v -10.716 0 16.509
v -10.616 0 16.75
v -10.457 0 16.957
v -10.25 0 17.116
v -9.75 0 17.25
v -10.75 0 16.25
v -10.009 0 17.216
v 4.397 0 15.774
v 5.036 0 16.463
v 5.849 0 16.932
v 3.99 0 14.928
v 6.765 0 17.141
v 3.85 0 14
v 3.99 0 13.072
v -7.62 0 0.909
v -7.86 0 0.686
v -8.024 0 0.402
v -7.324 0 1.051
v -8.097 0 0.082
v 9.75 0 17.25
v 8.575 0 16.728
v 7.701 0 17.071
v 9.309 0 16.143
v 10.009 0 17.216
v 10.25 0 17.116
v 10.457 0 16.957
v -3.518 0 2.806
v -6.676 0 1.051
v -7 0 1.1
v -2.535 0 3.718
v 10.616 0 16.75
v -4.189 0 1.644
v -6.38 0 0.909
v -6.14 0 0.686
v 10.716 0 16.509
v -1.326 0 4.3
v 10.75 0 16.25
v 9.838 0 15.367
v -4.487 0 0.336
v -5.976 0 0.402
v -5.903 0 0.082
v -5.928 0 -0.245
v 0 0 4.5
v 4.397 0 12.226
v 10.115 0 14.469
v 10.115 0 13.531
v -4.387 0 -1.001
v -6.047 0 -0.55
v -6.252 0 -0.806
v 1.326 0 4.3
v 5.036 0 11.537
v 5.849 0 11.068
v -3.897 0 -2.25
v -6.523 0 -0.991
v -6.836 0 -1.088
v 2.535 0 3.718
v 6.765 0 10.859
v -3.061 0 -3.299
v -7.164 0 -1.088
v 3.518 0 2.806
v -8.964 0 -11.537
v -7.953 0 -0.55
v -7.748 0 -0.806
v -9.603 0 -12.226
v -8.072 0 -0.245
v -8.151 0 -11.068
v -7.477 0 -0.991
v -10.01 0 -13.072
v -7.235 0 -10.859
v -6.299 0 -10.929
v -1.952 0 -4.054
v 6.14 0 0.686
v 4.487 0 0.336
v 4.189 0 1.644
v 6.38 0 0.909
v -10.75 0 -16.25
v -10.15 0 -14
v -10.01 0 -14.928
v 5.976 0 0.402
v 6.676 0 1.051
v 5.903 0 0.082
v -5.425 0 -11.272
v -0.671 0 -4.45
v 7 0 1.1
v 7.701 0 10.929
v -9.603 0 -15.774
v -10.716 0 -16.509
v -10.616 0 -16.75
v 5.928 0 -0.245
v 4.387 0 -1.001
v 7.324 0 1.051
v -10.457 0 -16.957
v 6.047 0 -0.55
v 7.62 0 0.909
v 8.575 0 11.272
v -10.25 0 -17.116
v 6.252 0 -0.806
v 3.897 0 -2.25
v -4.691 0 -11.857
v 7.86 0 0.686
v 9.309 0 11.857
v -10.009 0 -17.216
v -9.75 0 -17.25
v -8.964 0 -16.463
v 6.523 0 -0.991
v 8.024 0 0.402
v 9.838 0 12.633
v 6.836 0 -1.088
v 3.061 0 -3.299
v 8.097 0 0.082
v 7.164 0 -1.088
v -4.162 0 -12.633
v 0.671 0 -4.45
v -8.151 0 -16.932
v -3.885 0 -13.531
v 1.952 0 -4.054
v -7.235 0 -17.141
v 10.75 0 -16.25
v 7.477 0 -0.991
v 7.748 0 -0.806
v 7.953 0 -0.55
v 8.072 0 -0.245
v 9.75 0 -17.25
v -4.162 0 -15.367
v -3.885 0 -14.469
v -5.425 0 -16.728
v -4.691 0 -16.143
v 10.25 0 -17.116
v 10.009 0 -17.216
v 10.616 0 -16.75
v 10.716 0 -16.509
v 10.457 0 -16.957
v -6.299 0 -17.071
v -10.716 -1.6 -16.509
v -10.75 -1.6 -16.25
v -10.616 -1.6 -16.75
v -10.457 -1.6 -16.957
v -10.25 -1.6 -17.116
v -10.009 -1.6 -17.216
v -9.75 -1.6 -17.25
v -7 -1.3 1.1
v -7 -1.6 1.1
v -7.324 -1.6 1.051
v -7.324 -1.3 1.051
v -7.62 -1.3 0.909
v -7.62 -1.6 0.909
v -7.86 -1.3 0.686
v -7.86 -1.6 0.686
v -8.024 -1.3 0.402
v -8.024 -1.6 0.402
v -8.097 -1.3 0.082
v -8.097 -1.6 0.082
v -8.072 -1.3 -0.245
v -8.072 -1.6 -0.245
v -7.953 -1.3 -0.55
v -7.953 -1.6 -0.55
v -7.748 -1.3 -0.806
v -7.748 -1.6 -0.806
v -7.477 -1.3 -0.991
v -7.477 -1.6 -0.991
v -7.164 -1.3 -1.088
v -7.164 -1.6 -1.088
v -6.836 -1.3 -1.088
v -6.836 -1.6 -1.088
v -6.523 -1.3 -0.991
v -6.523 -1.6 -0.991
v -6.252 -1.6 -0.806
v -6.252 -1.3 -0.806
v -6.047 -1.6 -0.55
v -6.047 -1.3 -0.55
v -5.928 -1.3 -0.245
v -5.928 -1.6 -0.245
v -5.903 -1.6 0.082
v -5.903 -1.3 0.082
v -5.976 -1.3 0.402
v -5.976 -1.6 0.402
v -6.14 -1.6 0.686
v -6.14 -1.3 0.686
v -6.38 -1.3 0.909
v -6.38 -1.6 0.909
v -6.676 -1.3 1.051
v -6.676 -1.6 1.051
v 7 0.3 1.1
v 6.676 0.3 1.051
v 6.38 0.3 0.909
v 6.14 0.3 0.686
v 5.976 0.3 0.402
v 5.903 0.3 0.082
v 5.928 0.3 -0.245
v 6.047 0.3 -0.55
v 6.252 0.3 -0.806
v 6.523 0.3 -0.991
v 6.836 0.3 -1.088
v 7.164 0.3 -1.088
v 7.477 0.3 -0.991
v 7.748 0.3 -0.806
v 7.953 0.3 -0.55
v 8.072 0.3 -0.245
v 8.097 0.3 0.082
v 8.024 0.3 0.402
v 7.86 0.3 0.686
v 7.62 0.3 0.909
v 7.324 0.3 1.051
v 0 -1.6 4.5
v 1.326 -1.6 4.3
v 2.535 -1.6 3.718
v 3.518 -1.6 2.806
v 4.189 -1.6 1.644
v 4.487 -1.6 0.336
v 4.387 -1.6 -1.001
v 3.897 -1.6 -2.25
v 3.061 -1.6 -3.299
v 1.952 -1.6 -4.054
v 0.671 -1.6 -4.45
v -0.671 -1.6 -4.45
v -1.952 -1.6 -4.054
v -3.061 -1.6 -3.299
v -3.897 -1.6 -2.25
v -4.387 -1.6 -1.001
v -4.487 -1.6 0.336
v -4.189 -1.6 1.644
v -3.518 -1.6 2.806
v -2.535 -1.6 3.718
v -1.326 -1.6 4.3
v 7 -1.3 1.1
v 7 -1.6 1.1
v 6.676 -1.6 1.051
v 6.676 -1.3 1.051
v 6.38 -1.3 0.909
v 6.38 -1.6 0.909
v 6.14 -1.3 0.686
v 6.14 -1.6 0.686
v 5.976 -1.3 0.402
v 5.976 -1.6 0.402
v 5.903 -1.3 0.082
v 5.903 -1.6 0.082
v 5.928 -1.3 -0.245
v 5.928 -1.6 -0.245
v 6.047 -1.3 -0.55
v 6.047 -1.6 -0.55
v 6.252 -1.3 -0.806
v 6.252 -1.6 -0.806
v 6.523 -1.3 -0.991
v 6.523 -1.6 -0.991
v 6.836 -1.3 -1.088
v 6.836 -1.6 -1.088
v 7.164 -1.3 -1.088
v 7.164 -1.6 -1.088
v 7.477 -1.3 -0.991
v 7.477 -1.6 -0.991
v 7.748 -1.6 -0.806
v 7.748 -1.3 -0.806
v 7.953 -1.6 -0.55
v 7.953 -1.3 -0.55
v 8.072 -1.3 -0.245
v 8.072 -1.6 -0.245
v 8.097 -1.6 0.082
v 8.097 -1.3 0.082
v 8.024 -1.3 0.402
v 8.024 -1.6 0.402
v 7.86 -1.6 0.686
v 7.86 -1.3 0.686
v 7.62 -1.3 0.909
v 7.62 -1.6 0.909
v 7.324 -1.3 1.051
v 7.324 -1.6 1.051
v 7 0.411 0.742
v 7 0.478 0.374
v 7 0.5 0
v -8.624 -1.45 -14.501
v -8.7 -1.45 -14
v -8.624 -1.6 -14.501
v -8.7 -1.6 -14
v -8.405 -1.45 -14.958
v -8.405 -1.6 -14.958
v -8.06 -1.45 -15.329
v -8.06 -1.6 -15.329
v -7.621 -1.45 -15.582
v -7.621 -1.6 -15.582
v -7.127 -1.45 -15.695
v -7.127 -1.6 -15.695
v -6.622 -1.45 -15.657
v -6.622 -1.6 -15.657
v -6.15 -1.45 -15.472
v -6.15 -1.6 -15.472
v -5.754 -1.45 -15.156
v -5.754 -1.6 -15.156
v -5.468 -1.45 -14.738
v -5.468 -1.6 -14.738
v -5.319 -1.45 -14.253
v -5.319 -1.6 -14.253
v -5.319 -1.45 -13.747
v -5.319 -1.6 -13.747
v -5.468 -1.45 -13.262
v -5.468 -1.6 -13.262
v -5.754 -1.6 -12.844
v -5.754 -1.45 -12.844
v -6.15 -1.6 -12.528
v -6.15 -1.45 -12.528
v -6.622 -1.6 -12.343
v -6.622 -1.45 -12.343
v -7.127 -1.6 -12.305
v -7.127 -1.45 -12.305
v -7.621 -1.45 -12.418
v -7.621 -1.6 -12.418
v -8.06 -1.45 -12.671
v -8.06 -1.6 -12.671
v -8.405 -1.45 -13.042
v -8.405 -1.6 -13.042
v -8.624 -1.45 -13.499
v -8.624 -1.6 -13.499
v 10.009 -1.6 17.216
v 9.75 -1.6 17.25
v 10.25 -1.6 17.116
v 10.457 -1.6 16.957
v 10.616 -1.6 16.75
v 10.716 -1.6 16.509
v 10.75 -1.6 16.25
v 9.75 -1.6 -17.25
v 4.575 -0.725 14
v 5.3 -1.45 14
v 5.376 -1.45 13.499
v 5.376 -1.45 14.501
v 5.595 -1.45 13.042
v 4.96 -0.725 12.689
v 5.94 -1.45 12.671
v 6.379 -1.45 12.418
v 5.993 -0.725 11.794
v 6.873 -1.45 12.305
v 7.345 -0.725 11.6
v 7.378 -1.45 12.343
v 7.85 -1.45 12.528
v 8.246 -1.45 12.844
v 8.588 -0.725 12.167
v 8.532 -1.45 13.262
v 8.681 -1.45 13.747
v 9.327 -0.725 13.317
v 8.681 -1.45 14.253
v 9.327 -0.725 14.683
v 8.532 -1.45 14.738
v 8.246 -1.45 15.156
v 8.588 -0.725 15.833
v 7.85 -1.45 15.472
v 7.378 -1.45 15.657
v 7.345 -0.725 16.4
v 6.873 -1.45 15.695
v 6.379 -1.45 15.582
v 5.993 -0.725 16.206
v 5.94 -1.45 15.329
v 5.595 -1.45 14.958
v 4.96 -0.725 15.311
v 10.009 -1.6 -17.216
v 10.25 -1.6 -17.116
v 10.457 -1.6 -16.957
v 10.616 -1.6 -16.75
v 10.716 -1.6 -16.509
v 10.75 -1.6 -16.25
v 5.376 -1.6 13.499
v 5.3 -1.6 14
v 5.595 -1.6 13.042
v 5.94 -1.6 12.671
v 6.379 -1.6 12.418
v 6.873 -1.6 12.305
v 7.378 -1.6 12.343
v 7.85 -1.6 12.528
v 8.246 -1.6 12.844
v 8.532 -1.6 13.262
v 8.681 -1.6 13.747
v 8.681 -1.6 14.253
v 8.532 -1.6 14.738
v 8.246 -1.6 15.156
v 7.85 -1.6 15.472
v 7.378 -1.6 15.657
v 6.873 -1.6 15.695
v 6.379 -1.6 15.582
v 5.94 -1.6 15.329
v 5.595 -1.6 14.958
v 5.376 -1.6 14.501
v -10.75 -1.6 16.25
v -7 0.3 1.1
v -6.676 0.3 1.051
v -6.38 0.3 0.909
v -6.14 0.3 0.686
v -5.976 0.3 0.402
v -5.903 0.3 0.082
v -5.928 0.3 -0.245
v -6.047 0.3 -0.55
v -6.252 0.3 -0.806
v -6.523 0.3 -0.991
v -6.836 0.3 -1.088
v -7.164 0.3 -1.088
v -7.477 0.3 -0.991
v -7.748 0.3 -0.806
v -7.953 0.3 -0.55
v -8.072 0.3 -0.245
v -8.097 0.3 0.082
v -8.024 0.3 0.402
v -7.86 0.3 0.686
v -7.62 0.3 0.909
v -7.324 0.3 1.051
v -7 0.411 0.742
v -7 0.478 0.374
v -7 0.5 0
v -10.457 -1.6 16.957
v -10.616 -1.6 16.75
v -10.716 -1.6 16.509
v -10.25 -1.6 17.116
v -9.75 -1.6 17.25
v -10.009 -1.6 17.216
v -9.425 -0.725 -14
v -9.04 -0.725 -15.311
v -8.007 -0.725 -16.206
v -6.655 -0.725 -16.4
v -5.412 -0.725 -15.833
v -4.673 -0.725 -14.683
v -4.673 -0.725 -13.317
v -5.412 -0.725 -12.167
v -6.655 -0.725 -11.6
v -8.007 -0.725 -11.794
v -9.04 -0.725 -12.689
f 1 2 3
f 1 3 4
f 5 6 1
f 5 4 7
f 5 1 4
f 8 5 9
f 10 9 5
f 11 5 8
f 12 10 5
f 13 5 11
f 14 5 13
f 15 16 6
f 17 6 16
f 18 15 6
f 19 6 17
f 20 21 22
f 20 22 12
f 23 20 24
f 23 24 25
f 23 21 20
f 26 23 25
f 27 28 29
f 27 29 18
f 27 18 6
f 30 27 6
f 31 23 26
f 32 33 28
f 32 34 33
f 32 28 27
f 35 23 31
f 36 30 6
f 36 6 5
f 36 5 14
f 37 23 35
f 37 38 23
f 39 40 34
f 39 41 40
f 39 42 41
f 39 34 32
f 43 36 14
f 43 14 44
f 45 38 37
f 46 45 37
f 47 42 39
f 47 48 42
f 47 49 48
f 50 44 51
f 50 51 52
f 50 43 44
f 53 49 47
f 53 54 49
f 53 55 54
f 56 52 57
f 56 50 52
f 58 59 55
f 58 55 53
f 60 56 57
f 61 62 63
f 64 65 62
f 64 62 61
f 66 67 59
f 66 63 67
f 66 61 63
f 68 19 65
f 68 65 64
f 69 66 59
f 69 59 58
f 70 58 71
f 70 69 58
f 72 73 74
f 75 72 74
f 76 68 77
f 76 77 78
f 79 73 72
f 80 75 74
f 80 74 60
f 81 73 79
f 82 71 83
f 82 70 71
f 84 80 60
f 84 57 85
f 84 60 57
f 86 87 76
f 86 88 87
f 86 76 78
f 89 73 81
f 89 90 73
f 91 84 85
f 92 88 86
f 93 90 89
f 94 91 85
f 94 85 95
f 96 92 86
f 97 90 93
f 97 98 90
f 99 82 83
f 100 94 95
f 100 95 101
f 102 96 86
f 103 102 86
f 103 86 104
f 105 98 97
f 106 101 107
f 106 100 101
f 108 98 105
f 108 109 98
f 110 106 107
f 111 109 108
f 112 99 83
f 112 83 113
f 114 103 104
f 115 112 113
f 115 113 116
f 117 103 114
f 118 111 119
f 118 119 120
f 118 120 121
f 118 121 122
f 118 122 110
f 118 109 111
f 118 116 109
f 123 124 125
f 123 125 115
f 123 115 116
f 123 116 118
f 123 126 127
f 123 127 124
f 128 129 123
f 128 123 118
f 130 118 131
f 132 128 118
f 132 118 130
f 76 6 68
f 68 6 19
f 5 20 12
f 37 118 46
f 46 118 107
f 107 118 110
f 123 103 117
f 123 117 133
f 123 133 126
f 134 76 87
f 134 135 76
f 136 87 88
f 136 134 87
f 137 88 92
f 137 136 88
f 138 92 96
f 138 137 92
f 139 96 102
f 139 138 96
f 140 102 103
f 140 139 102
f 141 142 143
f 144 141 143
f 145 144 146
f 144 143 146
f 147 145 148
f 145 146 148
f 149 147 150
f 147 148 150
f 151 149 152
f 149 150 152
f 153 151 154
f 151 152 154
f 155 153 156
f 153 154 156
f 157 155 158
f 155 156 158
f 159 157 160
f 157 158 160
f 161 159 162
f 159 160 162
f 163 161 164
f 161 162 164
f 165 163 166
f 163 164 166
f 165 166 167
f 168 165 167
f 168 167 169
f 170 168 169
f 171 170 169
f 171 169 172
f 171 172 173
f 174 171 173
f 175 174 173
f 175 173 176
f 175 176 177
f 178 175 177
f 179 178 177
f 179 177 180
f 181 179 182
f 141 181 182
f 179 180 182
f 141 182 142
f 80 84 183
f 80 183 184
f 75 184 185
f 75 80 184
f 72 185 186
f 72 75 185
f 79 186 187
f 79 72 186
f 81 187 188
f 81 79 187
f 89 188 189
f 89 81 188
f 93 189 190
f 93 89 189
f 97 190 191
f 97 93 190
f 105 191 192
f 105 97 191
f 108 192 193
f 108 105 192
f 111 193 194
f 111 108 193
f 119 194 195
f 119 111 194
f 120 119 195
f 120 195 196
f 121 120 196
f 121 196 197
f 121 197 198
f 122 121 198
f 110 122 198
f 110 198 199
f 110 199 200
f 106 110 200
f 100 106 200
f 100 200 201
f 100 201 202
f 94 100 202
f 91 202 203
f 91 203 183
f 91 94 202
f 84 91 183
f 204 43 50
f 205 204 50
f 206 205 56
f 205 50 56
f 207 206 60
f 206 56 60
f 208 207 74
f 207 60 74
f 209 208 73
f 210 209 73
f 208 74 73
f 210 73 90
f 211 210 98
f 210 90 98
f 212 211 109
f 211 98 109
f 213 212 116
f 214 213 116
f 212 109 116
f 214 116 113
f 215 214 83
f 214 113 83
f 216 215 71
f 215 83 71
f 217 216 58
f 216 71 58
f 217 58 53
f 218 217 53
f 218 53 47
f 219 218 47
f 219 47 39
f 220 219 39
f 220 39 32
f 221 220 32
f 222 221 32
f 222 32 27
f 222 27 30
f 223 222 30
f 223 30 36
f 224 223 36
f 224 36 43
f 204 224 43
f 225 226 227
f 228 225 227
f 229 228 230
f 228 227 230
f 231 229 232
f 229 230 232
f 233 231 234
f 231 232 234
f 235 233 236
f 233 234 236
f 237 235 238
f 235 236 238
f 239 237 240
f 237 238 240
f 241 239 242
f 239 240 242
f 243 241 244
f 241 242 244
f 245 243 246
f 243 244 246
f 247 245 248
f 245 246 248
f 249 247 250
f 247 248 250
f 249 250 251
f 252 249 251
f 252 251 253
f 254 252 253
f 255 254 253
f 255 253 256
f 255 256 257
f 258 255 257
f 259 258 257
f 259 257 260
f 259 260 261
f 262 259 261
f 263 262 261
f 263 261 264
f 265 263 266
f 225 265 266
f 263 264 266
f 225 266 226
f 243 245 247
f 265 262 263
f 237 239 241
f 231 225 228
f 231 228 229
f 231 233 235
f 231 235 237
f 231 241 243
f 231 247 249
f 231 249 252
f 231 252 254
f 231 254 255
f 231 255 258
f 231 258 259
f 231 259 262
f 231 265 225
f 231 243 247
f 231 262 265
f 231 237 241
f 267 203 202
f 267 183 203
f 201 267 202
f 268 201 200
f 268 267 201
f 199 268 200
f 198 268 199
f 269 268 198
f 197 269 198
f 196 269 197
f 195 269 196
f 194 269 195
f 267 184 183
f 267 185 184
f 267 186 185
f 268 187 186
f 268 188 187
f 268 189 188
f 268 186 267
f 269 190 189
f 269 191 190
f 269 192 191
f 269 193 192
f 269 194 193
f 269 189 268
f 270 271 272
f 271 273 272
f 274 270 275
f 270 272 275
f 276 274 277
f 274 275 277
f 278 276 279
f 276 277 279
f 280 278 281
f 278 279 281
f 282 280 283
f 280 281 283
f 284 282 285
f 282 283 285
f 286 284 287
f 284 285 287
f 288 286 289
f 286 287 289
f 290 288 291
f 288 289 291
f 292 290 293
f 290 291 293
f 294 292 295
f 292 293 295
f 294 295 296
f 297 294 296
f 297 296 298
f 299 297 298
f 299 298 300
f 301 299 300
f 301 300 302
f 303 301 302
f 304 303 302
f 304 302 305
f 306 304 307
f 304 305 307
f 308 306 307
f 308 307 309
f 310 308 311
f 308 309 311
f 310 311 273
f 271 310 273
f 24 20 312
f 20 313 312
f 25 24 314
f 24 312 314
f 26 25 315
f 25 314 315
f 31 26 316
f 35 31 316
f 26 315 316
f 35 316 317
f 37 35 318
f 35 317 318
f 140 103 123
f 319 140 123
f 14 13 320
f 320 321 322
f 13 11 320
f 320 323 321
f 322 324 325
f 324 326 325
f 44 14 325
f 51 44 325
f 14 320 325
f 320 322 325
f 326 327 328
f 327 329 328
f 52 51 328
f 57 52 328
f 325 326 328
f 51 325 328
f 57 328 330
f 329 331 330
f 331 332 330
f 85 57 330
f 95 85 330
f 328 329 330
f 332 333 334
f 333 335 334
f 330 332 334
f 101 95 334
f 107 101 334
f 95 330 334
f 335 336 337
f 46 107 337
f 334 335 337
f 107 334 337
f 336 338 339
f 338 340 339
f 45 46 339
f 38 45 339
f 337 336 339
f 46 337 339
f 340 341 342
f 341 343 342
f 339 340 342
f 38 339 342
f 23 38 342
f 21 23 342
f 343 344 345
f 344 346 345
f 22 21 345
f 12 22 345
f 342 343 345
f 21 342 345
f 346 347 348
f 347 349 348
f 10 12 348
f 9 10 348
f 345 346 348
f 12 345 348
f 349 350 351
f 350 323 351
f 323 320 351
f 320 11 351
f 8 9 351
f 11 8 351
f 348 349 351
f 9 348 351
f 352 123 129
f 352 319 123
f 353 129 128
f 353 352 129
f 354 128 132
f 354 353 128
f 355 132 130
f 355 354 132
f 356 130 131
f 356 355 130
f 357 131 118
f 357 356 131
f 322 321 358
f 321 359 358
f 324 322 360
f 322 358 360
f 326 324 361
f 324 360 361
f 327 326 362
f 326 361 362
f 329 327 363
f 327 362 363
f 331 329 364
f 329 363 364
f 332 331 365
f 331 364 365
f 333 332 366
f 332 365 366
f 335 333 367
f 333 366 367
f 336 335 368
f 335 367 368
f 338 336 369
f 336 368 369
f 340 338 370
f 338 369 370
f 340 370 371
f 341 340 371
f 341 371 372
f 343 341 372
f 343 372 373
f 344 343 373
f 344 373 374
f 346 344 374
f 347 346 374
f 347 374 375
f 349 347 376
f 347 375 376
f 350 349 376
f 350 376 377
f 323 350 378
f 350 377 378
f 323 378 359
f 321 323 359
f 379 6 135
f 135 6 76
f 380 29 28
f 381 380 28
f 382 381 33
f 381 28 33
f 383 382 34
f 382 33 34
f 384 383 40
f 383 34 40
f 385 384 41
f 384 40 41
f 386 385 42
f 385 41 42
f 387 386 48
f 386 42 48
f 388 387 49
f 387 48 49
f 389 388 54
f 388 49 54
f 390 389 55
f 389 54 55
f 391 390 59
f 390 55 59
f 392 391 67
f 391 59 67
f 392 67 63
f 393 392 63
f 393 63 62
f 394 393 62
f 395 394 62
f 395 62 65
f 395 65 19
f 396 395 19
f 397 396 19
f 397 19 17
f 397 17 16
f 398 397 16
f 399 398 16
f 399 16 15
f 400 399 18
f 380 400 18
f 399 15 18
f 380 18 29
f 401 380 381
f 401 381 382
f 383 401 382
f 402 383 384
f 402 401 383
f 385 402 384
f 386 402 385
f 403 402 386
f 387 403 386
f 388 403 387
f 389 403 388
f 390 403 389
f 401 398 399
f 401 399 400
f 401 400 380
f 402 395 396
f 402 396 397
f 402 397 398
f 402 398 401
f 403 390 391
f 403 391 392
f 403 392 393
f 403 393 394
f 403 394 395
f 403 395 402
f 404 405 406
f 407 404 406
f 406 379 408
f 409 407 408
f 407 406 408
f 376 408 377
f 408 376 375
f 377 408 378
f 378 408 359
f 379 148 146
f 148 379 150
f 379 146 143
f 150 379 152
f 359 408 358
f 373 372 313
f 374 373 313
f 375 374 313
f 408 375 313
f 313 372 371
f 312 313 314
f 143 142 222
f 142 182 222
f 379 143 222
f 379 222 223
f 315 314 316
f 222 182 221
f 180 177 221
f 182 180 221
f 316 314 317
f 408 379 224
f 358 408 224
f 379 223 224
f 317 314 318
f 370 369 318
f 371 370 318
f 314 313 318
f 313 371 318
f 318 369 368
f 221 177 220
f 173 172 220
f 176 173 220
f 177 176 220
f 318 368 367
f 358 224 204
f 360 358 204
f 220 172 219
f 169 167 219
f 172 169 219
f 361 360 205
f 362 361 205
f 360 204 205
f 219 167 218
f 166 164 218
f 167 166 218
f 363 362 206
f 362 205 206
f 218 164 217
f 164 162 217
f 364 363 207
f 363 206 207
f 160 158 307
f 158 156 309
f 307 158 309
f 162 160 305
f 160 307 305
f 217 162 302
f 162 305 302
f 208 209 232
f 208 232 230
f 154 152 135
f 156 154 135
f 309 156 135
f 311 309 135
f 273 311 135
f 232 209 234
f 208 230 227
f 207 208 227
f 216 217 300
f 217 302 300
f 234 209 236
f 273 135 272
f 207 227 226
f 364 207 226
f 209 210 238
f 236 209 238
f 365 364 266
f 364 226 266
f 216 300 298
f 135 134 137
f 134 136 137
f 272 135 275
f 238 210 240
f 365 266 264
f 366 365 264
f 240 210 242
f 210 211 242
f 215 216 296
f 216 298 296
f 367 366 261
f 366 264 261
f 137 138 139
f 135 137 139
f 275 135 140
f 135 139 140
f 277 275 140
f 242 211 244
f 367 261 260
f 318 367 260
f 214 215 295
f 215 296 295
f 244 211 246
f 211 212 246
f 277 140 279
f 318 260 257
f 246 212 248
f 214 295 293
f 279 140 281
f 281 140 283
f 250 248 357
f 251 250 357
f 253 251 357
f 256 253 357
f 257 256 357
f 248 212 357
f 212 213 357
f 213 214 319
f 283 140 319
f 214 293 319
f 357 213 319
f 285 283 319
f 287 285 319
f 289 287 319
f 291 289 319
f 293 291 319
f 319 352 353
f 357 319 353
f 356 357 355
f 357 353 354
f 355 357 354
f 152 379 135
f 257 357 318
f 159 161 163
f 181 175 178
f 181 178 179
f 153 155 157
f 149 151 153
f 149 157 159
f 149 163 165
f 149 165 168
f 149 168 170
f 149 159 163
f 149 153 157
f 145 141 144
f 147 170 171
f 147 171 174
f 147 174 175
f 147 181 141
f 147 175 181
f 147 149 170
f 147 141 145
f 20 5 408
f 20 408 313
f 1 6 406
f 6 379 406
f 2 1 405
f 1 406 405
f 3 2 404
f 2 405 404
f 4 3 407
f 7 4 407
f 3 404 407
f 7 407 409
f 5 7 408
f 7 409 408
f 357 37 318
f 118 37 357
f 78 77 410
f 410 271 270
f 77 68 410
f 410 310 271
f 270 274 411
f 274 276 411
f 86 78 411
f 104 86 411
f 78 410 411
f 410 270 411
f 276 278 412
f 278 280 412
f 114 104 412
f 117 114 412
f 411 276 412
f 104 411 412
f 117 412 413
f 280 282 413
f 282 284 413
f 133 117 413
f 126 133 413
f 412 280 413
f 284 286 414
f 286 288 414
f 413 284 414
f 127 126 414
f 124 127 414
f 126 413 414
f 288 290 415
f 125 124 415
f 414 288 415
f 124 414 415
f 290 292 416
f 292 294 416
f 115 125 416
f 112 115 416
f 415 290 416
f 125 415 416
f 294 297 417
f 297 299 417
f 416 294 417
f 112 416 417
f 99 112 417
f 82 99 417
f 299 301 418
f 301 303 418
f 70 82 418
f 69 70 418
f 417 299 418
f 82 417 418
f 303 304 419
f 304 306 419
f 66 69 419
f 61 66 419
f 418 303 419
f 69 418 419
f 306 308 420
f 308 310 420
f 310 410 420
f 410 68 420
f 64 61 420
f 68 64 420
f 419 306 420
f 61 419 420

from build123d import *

# Parameters (mm, degrees)
BASES_W                                         = 21.5
BASES_H                                         = 34.5
BASE_DEPTH                                      = 1.6
CSK_FOR_M3_FLAT_HEAD_MACHINE_SCREW1_D           = 3.4
CSK_FOR_M3_FLAT_HEAD_MACHINE_SCREW1_DEPTH       = 11
CSK_FOR_M3_FLAT_HEAD_MACHINE_SCREW1_CSINK_D     = 6.3
CSK_FOR_M3_FLAT_HEAD_MACHINE_SCREW1_CSINK_ANGLE = 90
CSK_FOR_M3_FLAT_HEAD_MACHINE_SCREW1_TIP         = 1.021463052
BORES_R                                         = 4.5
BORE_DEPTH                                      = 21.388354519
LOCKINGFEATURES_R                               = 1.1
LOCKING_FEATURE_DEPTH                           = 0.3
LF_DOME_FACE_RADIUS                             = 1.1
LF_DOME_HEIGHT                                  = 0.2
LF_HM_COPY_1_FACE_RADIUS                        = 1.1
LF_HM_COPY_1_HEIGHT                             = 0.2
LFBOTTOMCUT_R                                   = 1.1
LF_BOTTOM_CUT_DEPTH                             = 0.3
BASE_FILLET_R                                   = 1


with BuildPart() as part:
    # BaseS → BASE (new body)
    with BuildSketch(Plane(origin=(0, 0, 0), x_dir=(1, 0, 0), z_dir=(0, 1, 0))):
        Rectangle(BASES_W, BASES_H)
    extrude(amount=-BASE_DEPTH)

    # CSK for M3 Flat Head Machine Screw1
    with Locations(Plane(origin=(0, 0, 0), x_dir=(1, 0, 0), z_dir=(0, 1, 0))):
        with Locations((-7, 14), (7, -14)):
            CounterSinkHole(CSK_FOR_M3_FLAT_HEAD_MACHINE_SCREW1_D / 2, CSK_FOR_M3_FLAT_HEAD_MACHINE_SCREW1_CSINK_D / 2, depth=CSK_FOR_M3_FLAT_HEAD_MACHINE_SCREW1_DEPTH, counter_sink_angle=CSK_FOR_M3_FLAT_HEAD_MACHINE_SCREW1_CSINK_ANGLE)
            with Locations((0, 0, -(CSK_FOR_M3_FLAT_HEAD_MACHINE_SCREW1_DEPTH + CSK_FOR_M3_FLAT_HEAD_MACHINE_SCREW1_TIP / 2))):  # 118° drill point
                Cone(0, CSK_FOR_M3_FLAT_HEAD_MACHINE_SCREW1_D / 2, CSK_FOR_M3_FLAT_HEAD_MACHINE_SCREW1_TIP, mode=Mode.SUBTRACT)

    # BoreS → BORE (cut, through all)
    with BuildSketch(Plane(origin=(0, 0, 0), x_dir=(1, 0, 0), z_dir=(0, 1, 0))):
        with Locations(Location((0, 0, 0), (0, 0, 270))):
            Circle(BORES_R)
    extrude(amount=-BORE_DEPTH, mode=Mode.SUBTRACT)

    # LockingFeatureS → LOCKING FEATURE (add)
    with BuildSketch(Plane(origin=(0, 0, 0), x_dir=(1, 0, 0), z_dir=(0, 1, 0))):
        with Locations(Location((-7, 0, 0), (0, 0, 270))):
            Circle(LOCKINGFEATURES_R)
    locking_feature = extrude(amount=LOCKING_FEATURE_DEPTH)

    # LF DOME: a dome of height H over a round flat face of radius A is a cap of a sphere of radius (A * A + H * H) / (2 * H)
    lf_dome_r = (LF_DOME_FACE_RADIUS * LF_DOME_FACE_RADIUS + LF_DOME_HEIGHT * LF_DOME_HEIGHT) / (2 * LF_DOME_HEIGHT)
    lf_dome_base = Plane((-7, 0.3, 0), z_dir=(0, 1, 0))
    with Locations(lf_dome_base.offset(LF_DOME_HEIGHT - lf_dome_r)):
        lf_dome_ball = Sphere(lf_dome_r, mode=Mode.PRIVATE)
    add(split(lf_dome_ball, bisect_by=lf_dome_base, keep=Keep.TOP, mode=Mode.PRIVATE))

    # LF HM: LOCKING FEATURE across plane
    add(locking_feature.mirror(Plane(origin=(0, 0, 0), x_dir=(0, 0, 1), z_dir=(1, 0, 0))))

    # LF HM copy 1: a dome of height H over a round flat face of radius A is a cap of a sphere of radius (A * A + H * H) / (2 * H)
    lf_hm_copy_1_r = (LF_HM_COPY_1_FACE_RADIUS * LF_HM_COPY_1_FACE_RADIUS + LF_HM_COPY_1_HEIGHT * LF_HM_COPY_1_HEIGHT) / (2 * LF_HM_COPY_1_HEIGHT)
    lf_hm_copy_1_base = Plane((7, 0.3, 0), z_dir=(0, 1, 0))
    with Locations(lf_hm_copy_1_base.offset(LF_HM_COPY_1_HEIGHT - lf_hm_copy_1_r)):
        lf_hm_copy_1_ball = Sphere(lf_hm_copy_1_r, mode=Mode.PRIVATE)
    add(split(lf_hm_copy_1_ball, bisect_by=lf_hm_copy_1_base, keep=Keep.TOP, mode=Mode.PRIVATE))

    # LFBottomCut → LF BOTTOM CUT (cut)
    with BuildSketch(Plane(origin=(0, -1.6, 0), x_dir=(-1, 0, 0), z_dir=(0, -1, 0))):
        with Locations(Location((7, 0, 0), (0, 0, 270))):
            Circle(LFBOTTOMCUT_R)
        with Locations(Location((-7, 0, 0), (0, 0, 270))):
            Circle(LFBOTTOMCUT_R)
    extrude(amount=-LF_BOTTOM_CUT_DEPTH, mode=Mode.SUBTRACT)

    # BASE FILLET
    base_fillet_edges = [part.edges().sort_by_distance(p)[0] for p in [
        (10.75, -0.8, 17.25),
        (-10.75, -0.8, 17.25),
        (-10.75, -0.8, -17.25),
        (10.75, -0.8, -17.25),
    ]]
    fillet(base_fillet_edges, radius=BASE_FILLET_R)


solid = part.part
